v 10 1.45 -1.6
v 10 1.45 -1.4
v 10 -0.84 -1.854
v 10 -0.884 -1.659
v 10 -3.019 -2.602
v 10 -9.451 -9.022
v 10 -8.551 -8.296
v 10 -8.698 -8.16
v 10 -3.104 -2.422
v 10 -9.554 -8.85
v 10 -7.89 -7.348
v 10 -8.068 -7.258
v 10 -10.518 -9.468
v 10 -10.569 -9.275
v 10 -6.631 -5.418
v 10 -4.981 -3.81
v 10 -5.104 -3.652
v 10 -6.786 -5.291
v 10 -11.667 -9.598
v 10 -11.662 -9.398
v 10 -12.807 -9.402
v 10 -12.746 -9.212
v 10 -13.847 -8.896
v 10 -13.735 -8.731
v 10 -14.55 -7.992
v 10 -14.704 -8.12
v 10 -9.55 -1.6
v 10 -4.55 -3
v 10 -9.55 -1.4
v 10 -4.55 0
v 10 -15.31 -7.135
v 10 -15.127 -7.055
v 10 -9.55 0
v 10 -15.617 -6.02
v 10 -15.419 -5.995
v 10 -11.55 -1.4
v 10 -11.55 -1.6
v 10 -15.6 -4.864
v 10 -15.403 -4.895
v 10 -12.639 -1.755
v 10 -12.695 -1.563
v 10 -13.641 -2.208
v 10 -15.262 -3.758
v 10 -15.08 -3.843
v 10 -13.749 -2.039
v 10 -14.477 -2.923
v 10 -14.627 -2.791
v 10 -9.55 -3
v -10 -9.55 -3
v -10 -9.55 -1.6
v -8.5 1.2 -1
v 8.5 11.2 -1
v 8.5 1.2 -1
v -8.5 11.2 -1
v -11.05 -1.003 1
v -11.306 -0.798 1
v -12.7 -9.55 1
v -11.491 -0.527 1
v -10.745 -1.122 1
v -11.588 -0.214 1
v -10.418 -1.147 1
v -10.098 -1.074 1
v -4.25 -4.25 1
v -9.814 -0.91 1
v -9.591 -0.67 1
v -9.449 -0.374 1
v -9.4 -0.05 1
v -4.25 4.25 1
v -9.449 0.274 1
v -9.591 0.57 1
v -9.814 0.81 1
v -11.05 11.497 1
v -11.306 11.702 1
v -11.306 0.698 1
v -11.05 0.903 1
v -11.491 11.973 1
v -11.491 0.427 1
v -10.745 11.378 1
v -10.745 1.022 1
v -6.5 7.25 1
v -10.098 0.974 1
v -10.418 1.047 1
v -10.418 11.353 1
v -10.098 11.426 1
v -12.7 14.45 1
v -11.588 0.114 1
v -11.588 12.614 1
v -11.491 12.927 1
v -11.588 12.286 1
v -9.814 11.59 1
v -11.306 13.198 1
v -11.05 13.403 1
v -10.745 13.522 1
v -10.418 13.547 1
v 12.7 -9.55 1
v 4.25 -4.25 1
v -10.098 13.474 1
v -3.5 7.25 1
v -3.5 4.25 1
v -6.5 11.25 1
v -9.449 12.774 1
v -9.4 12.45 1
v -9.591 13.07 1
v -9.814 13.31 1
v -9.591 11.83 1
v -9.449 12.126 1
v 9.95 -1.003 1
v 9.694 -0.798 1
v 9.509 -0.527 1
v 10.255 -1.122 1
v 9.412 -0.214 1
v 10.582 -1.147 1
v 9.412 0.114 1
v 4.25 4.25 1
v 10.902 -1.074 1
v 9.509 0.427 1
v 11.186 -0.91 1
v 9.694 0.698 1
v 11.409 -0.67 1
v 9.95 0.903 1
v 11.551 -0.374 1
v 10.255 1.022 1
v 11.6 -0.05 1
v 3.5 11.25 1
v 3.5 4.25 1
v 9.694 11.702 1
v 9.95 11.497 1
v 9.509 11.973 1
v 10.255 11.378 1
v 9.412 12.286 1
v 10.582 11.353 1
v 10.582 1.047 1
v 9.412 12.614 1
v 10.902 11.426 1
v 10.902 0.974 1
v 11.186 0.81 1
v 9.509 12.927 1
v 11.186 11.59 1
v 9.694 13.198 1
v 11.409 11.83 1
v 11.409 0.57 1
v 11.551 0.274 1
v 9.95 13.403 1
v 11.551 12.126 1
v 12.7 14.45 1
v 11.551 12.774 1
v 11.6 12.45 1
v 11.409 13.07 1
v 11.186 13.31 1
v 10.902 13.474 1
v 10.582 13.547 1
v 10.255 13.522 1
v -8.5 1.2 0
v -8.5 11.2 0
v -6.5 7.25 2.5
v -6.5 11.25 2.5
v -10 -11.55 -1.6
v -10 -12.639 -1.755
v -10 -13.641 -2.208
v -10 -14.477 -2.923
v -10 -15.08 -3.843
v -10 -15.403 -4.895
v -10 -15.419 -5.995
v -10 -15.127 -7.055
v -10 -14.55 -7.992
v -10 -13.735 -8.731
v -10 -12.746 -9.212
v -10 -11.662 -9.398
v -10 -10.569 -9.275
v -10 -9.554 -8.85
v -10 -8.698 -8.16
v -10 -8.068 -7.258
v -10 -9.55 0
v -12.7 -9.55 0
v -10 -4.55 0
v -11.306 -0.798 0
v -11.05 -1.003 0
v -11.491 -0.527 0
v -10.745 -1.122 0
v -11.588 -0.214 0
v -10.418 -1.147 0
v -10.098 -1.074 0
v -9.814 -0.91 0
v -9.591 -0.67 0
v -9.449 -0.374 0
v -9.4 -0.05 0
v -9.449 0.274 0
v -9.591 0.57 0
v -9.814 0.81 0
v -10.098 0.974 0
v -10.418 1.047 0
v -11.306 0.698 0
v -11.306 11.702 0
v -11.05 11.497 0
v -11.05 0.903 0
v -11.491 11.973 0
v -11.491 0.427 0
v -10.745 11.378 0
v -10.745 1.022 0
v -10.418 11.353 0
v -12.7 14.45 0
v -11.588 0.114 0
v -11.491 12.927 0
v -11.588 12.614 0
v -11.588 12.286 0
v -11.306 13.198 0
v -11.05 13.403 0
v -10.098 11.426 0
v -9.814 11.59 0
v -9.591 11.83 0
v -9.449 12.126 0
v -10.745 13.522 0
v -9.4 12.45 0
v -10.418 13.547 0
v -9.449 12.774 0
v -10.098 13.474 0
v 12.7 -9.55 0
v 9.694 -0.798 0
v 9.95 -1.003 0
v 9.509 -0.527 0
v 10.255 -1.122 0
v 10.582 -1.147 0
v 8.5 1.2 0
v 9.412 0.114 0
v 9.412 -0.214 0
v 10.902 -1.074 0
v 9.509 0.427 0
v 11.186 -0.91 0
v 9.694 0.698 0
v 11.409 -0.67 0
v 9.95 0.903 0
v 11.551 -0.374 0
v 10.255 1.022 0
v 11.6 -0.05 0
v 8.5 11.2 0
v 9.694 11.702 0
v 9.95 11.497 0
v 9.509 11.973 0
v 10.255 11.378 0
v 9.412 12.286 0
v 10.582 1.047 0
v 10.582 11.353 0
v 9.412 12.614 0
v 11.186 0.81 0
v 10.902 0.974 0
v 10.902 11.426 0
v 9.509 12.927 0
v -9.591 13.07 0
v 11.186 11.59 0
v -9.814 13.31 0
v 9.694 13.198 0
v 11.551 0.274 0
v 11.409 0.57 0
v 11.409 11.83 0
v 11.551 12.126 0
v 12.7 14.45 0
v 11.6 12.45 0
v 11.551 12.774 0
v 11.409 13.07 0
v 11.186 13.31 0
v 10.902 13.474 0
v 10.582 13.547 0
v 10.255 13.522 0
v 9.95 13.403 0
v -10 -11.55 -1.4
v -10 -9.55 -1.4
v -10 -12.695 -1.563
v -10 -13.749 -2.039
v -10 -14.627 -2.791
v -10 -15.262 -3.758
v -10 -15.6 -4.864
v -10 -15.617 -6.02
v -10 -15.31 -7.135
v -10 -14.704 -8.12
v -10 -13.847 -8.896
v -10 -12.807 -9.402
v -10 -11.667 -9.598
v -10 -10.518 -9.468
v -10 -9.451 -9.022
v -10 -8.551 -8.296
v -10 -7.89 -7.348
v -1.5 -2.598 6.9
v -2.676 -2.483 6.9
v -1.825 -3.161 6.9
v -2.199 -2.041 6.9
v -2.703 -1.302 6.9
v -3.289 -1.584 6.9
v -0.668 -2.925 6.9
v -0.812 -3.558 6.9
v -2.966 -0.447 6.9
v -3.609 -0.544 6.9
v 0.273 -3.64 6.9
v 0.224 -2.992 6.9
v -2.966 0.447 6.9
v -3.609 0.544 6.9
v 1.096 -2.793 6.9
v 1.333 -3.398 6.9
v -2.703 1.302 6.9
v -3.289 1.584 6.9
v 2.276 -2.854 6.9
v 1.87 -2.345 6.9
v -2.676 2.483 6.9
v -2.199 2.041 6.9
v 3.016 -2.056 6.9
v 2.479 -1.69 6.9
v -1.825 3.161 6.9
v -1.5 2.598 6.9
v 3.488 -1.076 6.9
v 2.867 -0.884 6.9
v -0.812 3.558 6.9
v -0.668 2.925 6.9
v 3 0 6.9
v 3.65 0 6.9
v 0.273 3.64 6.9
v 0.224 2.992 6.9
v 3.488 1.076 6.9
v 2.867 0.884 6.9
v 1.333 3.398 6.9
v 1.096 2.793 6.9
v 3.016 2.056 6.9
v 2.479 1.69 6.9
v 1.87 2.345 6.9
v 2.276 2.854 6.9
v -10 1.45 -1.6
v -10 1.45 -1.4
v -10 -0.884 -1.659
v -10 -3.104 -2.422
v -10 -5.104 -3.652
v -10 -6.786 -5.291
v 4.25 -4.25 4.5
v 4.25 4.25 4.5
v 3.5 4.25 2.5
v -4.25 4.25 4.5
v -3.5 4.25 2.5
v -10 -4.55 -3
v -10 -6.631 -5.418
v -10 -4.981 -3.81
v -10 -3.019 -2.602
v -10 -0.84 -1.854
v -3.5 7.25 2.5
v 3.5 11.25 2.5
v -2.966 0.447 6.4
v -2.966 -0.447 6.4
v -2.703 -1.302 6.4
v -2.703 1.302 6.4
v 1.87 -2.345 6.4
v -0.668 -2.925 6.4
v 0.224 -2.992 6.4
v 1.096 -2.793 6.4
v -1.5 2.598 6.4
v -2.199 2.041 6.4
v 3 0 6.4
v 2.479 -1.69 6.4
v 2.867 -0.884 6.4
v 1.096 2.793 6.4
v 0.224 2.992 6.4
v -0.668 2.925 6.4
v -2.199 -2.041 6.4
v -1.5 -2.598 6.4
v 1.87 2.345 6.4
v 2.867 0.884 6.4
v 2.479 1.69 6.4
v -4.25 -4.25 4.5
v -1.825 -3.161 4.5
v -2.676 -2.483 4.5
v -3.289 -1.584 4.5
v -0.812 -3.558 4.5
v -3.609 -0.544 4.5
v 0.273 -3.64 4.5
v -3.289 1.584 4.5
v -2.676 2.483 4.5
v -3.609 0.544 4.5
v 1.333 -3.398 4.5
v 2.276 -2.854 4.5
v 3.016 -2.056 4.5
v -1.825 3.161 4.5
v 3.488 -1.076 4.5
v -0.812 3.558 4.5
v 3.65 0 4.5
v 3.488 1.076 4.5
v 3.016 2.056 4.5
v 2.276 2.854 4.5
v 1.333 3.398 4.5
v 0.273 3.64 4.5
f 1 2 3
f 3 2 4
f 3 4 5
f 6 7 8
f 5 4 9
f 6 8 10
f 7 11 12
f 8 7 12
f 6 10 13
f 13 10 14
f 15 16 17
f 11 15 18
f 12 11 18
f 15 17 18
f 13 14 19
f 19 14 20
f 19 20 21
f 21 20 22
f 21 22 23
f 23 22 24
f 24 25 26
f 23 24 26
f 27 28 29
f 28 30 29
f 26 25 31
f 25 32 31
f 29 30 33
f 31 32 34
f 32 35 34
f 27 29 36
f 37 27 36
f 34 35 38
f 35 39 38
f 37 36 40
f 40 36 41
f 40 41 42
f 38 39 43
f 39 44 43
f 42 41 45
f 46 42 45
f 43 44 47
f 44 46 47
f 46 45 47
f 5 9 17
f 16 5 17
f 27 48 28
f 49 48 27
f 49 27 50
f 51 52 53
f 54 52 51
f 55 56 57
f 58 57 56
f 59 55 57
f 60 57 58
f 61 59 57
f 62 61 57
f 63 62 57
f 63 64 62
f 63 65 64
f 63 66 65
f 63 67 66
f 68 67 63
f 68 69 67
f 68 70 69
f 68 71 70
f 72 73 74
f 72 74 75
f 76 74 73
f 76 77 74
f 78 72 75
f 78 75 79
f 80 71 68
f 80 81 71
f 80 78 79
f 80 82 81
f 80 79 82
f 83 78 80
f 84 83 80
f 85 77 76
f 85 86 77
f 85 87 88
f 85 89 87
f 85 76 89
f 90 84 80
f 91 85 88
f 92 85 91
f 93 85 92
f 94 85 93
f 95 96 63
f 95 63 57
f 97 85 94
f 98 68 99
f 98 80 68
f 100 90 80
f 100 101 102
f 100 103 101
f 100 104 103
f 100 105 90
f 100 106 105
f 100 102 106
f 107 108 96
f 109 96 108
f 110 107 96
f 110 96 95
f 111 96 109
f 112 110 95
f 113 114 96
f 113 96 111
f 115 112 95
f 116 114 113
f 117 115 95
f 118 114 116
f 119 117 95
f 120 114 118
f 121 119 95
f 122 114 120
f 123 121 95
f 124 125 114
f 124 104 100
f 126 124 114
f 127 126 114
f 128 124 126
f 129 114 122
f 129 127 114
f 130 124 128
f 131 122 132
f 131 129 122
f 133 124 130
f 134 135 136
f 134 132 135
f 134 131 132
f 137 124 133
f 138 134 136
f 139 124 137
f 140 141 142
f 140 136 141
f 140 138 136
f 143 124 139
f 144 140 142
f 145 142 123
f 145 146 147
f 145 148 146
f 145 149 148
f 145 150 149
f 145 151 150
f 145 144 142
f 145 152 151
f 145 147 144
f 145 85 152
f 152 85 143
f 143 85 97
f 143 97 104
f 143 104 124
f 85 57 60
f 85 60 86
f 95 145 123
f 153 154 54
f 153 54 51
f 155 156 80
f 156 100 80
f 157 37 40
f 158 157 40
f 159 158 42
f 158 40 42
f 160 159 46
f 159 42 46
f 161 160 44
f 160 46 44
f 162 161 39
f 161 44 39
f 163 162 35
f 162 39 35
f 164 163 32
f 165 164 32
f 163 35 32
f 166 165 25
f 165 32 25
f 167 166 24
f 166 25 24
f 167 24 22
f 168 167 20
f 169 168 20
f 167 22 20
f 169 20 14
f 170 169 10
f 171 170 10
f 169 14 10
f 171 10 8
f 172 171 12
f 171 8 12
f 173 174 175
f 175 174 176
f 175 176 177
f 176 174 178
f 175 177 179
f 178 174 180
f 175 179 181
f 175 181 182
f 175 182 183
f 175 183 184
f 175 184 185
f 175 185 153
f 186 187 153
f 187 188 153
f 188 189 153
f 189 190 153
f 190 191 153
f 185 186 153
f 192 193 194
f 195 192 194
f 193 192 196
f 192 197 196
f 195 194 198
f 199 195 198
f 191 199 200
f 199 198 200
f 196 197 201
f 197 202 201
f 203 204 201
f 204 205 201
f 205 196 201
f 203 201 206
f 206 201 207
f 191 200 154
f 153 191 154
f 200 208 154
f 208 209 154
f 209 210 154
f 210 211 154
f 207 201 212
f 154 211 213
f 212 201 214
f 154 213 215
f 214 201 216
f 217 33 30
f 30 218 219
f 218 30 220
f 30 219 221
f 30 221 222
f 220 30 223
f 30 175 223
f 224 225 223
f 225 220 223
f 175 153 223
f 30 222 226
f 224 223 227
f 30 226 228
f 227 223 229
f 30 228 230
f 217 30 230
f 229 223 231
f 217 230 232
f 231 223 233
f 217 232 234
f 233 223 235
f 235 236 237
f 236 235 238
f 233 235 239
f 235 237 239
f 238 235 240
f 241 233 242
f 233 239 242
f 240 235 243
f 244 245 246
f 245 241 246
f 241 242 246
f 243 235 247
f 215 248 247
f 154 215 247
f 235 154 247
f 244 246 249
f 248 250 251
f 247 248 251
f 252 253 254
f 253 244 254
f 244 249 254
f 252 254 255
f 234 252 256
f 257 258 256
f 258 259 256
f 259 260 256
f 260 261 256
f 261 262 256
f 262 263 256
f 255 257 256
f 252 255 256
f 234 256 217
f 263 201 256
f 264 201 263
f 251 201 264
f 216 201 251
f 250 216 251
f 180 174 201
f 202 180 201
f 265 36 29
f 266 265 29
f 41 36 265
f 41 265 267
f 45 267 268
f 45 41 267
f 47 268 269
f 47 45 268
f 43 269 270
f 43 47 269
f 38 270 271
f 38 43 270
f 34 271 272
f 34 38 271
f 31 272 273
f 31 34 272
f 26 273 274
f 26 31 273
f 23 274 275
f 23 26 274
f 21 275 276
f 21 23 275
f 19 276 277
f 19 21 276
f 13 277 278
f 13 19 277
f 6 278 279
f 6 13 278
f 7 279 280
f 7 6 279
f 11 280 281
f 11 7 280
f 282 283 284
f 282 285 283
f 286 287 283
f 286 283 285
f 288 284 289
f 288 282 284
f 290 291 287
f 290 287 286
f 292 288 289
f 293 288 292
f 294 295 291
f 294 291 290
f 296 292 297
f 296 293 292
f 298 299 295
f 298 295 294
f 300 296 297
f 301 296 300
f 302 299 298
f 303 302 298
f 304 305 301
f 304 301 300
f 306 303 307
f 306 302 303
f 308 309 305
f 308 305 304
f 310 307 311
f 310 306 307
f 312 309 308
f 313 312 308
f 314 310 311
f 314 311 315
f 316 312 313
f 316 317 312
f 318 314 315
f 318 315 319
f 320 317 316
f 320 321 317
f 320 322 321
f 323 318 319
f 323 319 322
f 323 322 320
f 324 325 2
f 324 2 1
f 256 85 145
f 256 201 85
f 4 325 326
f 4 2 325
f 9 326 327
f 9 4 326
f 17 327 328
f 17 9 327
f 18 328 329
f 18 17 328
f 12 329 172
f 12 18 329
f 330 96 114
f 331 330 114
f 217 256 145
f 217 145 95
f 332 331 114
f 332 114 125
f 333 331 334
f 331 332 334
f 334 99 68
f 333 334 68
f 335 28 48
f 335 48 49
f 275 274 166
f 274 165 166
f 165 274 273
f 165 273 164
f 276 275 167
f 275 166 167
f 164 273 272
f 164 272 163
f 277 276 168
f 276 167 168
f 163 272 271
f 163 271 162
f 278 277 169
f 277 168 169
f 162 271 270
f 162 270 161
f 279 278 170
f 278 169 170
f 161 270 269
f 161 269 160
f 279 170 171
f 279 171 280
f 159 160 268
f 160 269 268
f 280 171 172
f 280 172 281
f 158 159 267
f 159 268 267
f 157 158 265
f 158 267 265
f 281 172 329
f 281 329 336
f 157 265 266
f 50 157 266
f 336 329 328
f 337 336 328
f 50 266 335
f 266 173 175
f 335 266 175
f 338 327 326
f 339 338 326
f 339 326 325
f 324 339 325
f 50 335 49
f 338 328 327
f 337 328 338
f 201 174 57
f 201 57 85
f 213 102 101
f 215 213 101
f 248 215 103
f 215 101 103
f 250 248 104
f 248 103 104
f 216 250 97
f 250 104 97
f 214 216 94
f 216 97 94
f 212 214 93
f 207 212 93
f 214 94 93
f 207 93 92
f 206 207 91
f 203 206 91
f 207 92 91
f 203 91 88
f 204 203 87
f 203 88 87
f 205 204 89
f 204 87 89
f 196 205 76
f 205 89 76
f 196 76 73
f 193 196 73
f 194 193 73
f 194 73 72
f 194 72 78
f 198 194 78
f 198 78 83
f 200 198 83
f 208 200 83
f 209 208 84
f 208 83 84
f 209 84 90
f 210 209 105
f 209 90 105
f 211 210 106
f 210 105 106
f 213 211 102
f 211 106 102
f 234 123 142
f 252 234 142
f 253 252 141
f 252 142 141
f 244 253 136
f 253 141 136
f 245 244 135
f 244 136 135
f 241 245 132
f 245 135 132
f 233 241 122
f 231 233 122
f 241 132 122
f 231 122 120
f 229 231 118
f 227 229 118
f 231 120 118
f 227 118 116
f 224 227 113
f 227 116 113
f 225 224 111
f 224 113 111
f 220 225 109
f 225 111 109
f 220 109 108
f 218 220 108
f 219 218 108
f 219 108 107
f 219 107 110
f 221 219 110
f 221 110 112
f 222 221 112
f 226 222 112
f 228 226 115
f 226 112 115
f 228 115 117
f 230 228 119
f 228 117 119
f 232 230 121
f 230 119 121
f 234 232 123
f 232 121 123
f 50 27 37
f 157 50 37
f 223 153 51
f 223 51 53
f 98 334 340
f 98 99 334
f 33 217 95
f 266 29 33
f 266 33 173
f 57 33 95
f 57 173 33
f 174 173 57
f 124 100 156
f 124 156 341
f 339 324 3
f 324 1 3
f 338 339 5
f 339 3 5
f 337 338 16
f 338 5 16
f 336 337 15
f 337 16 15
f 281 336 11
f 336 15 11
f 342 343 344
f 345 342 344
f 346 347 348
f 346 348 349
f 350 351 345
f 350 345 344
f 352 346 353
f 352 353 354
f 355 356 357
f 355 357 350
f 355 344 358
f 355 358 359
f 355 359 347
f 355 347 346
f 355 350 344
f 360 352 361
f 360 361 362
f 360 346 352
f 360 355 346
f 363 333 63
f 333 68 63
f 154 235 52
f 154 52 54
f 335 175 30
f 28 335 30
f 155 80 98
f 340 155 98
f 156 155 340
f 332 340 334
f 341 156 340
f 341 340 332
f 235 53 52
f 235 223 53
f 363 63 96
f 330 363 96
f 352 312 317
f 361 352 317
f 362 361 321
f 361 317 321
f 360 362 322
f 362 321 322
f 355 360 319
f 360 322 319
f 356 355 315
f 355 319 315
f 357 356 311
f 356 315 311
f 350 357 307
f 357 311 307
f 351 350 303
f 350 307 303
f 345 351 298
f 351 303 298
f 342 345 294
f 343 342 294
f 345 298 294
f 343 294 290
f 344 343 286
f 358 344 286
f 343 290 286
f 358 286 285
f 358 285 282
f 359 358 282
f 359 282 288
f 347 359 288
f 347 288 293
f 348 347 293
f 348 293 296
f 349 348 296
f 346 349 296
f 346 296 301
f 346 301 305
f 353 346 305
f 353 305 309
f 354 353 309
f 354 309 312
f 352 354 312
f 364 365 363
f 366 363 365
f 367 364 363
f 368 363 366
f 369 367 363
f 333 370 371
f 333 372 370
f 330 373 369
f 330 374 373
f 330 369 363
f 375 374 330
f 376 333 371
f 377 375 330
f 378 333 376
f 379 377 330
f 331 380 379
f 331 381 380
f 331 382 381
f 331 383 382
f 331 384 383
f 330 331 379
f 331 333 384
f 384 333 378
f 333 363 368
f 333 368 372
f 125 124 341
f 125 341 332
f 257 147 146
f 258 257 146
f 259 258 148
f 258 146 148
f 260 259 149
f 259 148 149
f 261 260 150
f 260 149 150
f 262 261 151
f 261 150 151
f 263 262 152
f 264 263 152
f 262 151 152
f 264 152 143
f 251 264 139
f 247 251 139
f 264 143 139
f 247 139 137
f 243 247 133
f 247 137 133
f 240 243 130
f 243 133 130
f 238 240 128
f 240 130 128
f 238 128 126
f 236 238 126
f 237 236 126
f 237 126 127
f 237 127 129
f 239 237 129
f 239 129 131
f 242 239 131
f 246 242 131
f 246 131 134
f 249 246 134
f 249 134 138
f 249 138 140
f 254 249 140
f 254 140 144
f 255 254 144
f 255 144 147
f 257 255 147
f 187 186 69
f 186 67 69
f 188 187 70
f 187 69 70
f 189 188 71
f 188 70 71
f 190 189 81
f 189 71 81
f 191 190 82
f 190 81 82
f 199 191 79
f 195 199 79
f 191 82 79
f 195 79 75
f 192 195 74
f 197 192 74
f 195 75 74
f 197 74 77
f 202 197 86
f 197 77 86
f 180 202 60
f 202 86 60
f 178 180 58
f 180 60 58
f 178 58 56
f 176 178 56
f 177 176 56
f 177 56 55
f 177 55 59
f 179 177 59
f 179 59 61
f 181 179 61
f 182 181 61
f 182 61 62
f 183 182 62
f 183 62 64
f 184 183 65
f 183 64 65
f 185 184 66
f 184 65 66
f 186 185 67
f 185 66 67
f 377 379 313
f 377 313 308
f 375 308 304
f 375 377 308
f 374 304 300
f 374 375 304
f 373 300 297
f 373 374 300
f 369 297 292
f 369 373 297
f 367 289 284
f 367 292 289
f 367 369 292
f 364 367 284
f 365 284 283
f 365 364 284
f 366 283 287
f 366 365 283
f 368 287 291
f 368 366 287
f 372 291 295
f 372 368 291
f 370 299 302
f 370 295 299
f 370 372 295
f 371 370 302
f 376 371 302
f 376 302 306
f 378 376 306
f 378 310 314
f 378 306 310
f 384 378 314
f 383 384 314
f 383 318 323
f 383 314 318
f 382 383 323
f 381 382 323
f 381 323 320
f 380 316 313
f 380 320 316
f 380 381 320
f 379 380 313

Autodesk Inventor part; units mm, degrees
ref_plane "YZ Plane" through (0, 0, 0) normal (1, 0, 0) x (0, 1, 0)
ref_plane "XZ Plane" through (0, 0, 0) normal (0, 1, 0) x (-1, 0, 0)
ref_plane "XY Plane" through (0, 0, 0) normal (0, 0, 1) x (1, 0, 0)
sketch "スケッチ1" plane through (0, 0, 0) normal (0, 0, 1) x (1, 0, 0)
  line L0 (-12.7, 14.45) -> (12.7, 14.45)
  line L1 (12.7, 14.45) -> (12.7, -9.55)
  line L2 (12.7, -9.55) -> (-12.7, -9.55)
  line L3 (-12.7, -9.55) -> (-12.7, 14.45)
  line L4 (-12.7, 14.45) -> (12.7, -9.55) construction
  line L5 (12.7, 14.45) -> (-12.7, -9.55) construction
  point P0 (0, 0)
  point P1 (0, 2.45)
  dimension "d0" = 25.4
  dimension "d1" = 24
  dimension "d2" = 14.45
extrude "押し出し1" add sketch "スケッチ1" along normal blind 1
sketch "スケッチ2" plane through (0, 0, 1) normal (0, 0, 1) x (1, 0, 0)
  line L0 (4.25, 4.25) -> (-4.25, 4.25)
  line L1 (-4.25, 4.25) -> (-4.25, -4.25)
  line L2 (-4.25, -4.25) -> (4.25, -4.25)
  line L3 (4.25, -4.25) -> (4.25, 4.25)
  line L4 (4.25, 4.25) -> (-4.25, -4.25) construction
  line L5 (-4.25, 4.25) -> (4.25, -4.25) construction
  point P0 (0, 0)
  dimension "d5" = 8.5
extrude "押し出し2" add sketch "スケッチ2" along normal blind 3.5
sketch "スケッチ3" plane through (0, 0, 4.5) normal (0, 0, 1) x (1, 0, 0)
  circle A0 centre (0, 0) radius 3.65
  dimension "d8" = 7.3
extrude "押し出し3" add sketch "スケッチ3" along normal blind 2.4
sketch "スケッチ4" plane through (0, 0, 6.9) normal (0, 0, 1) x (1, 0, 0)
  circle A0 centre (0, 0) radius 3
  dimension "d11" = 6
extrude "押し出し4" cut sketch "スケッチ4" against normal blind 0.5
sketch "スケッチ5" plane through (0, 0, 1) normal (0, 0, 1) x (1, 0, 0)
  line L0 (10.5, -0.05) -> (-10.5, -0.05) construction
  line L1 (-10.5, -0.05) -> (-10.5, 12.45) construction
  line L2 (-10.5, 12.45) -> (10.5, 12.45) construction
  line L3 (10.5, 12.45) -> (10.5, -0.05) construction
  line L4 (10.5, -0.05) -> (-10.5, 12.45) construction
  line L5 (-10.5, -0.05) -> (10.5, 12.45) construction
  line L6 (12.7, 14.45) -> (-12.7, 14.45) projected
  circle A0 centre (-10.5, 12.45) radius 1.1
  circle A1 centre (10.5, 12.45) radius 1.1
  circle A2 centre (-10.5, -0.05) radius 1.1
  circle A3 centre (10.5, -0.05) radius 1.1
  point P0 (0, 0)
  point P1 (0, 6.2)
  dimension "d14" = 21
  dimension "d15" = 12.5
  dimension "d16" = 2
  dimension "d17" = 2.2
extrude "押し出し5" cut sketch "スケッチ5" against normal through all
sketch "スケッチ6" plane through (0, 0, 0) normal (0, 0, -1) x (-1, 0, 0)
  line L0 (10, -4.55) -> (-10, -4.55)
  line L1 (-10, -4.55) -> (-10, -9.55)
  line L2 (-10, -9.55) -> (10, -9.55)
  line L3 (10, -9.55) -> (10, -4.55)
  line L4 (10, -4.55) -> (-10, -9.55) construction
  line L5 (-10, -4.55) -> (10, -9.55) construction
  line L6 (12.7, -9.55) -> (-12.7, -9.55) projected
  point P0 (0, 0)
  point P1 (0, -7.05)
  dimension "d20" = 20
  dimension "d21" = 5
extrude "押し出し6" add sketch "スケッチ6" along normal blind 3
sketch "スケッチ7" plane through (0, 0, 0) normal (0, 0, -1) x (-1, 0, 0)
  line L0 (8.5, 1.2) -> (-8.5, 1.2)
  line L1 (-8.5, 1.2) -> (-8.5, 11.2)
  line L2 (-8.5, 11.2) -> (8.5, 11.2)
  line L3 (8.5, 11.2) -> (8.5, 1.2)
  line L4 (8.5, 1.2) -> (-8.5, 11.2) construction
  line L5 (-8.5, 1.2) -> (8.5, 11.2) construction
  circle A0 centre (-10.5, 12.45) radius 1.1 projected
  circle A1 centre (-10.5, -0.05) radius 1.1 projected
  point P0 (0, 0)
  point P1 (0, 6.2)
  dimension "d24" = 17
  dimension "d25" = 10
  dimension "d26" = 6.25
  dimension "d27" = 6.25
extrude "押し出し7" add sketch "スケッチ7" along normal blind 1 contours L0 L1 L2 L3
sketch "スケッチ8" plane through (10, -9.55, 0) normal (1, 0, 0) x (0, 0, -1)
  line L0 (1.6, -2) -> (1.4, -2) construction
  line L1 (1.4, -2) -> (1.4, 0)
  line L2 (1.4, 0) -> (1.6, 0)
  line L3 (1.6, 0) -> (1.6, -2)
  line L4 (1.6, -2) -> (1.4, 0) construction
  line L5 (1.4, -2) -> (1.6, 0) construction
  line L6 (0, 0) -> (3, 0) projected
  circle A0 centre (5.5, -2) radius 4 construction
  line L7 (1.5, 0) -> (1.5, -2) construction
  circle A1 centre (5.5, -2) radius 4.1
  circle A2 centre (5.5, -2) radius 3.9
  arc A3 (1.4, 11) -> (7.2575, 1.4815) centre (12.0625, 11) ccw
  line L8 (1.4, 0) -> (1.4, 9.037) construction
  line L9 (1.6, 0) -> (1.6, 10.1272) construction
  arc A4 (1.6, 11) -> (7.3476, 1.6601) centre (12.0625, 11) ccw
  line L10 (1.4, 11) -> (1.6, 11)
  point P0 (0, 9.55)
  point P1 (1.5, -1)
  dimension "d30" = 0.2
  dimension "d31" = 2
  dimension "d32" = 8
  dimension "d33" = 11
extrude "押し出し8" add sketch "スケッチ8" against normal up to surface (20 mm away) contours A1 L3 A2 A3 | L1 L2 L3 A1 | A1 A3 L10 A4
sketch "スケッチ9" plane through (0, 0, 1) normal (0, 0, 1) x (1, 0, 0)
  line L0 (-3.5, 11.25) -> (3.5, 11.25)
  line L1 (3.5, 11.25) -> (3.5, 4.25)
  line L2 (3.5, 4.25) -> (-3.5, 4.25)
  line L3 (-3.5, 4.25) -> (-3.5, 11.25)
  line L4 (-3.5, 11.25) -> (3.5, 4.25) construction
  line L5 (3.5, 11.25) -> (-3.5, 4.25) construction
  line L6 (-4.25, 4.25) -> (4.25, 4.25) projected
  line L7 (3.5, 11.25) -> (-6.5, 11.25)
  line L8 (-6.5, 11.25) -> (-6.5, 7.25)
  line L9 (-6.5, 7.25) -> (3.5, 7.25)
  line L10 (3.5, 7.25) -> (3.5, 11.25)
  point P0 (0, 0)
  point P1 (0, 7.75)
  point P2 (-3.5, 7.25)
  dimension "d65" = 7
  dimension "d66" = 7
  dimension "d67" = 10
  dimension "d68" = 4
extrude "押し出し9" add sketch "スケッチ9" along normal blind 1.5
equation "\"d26\" = d27"
properties part number "cam"
